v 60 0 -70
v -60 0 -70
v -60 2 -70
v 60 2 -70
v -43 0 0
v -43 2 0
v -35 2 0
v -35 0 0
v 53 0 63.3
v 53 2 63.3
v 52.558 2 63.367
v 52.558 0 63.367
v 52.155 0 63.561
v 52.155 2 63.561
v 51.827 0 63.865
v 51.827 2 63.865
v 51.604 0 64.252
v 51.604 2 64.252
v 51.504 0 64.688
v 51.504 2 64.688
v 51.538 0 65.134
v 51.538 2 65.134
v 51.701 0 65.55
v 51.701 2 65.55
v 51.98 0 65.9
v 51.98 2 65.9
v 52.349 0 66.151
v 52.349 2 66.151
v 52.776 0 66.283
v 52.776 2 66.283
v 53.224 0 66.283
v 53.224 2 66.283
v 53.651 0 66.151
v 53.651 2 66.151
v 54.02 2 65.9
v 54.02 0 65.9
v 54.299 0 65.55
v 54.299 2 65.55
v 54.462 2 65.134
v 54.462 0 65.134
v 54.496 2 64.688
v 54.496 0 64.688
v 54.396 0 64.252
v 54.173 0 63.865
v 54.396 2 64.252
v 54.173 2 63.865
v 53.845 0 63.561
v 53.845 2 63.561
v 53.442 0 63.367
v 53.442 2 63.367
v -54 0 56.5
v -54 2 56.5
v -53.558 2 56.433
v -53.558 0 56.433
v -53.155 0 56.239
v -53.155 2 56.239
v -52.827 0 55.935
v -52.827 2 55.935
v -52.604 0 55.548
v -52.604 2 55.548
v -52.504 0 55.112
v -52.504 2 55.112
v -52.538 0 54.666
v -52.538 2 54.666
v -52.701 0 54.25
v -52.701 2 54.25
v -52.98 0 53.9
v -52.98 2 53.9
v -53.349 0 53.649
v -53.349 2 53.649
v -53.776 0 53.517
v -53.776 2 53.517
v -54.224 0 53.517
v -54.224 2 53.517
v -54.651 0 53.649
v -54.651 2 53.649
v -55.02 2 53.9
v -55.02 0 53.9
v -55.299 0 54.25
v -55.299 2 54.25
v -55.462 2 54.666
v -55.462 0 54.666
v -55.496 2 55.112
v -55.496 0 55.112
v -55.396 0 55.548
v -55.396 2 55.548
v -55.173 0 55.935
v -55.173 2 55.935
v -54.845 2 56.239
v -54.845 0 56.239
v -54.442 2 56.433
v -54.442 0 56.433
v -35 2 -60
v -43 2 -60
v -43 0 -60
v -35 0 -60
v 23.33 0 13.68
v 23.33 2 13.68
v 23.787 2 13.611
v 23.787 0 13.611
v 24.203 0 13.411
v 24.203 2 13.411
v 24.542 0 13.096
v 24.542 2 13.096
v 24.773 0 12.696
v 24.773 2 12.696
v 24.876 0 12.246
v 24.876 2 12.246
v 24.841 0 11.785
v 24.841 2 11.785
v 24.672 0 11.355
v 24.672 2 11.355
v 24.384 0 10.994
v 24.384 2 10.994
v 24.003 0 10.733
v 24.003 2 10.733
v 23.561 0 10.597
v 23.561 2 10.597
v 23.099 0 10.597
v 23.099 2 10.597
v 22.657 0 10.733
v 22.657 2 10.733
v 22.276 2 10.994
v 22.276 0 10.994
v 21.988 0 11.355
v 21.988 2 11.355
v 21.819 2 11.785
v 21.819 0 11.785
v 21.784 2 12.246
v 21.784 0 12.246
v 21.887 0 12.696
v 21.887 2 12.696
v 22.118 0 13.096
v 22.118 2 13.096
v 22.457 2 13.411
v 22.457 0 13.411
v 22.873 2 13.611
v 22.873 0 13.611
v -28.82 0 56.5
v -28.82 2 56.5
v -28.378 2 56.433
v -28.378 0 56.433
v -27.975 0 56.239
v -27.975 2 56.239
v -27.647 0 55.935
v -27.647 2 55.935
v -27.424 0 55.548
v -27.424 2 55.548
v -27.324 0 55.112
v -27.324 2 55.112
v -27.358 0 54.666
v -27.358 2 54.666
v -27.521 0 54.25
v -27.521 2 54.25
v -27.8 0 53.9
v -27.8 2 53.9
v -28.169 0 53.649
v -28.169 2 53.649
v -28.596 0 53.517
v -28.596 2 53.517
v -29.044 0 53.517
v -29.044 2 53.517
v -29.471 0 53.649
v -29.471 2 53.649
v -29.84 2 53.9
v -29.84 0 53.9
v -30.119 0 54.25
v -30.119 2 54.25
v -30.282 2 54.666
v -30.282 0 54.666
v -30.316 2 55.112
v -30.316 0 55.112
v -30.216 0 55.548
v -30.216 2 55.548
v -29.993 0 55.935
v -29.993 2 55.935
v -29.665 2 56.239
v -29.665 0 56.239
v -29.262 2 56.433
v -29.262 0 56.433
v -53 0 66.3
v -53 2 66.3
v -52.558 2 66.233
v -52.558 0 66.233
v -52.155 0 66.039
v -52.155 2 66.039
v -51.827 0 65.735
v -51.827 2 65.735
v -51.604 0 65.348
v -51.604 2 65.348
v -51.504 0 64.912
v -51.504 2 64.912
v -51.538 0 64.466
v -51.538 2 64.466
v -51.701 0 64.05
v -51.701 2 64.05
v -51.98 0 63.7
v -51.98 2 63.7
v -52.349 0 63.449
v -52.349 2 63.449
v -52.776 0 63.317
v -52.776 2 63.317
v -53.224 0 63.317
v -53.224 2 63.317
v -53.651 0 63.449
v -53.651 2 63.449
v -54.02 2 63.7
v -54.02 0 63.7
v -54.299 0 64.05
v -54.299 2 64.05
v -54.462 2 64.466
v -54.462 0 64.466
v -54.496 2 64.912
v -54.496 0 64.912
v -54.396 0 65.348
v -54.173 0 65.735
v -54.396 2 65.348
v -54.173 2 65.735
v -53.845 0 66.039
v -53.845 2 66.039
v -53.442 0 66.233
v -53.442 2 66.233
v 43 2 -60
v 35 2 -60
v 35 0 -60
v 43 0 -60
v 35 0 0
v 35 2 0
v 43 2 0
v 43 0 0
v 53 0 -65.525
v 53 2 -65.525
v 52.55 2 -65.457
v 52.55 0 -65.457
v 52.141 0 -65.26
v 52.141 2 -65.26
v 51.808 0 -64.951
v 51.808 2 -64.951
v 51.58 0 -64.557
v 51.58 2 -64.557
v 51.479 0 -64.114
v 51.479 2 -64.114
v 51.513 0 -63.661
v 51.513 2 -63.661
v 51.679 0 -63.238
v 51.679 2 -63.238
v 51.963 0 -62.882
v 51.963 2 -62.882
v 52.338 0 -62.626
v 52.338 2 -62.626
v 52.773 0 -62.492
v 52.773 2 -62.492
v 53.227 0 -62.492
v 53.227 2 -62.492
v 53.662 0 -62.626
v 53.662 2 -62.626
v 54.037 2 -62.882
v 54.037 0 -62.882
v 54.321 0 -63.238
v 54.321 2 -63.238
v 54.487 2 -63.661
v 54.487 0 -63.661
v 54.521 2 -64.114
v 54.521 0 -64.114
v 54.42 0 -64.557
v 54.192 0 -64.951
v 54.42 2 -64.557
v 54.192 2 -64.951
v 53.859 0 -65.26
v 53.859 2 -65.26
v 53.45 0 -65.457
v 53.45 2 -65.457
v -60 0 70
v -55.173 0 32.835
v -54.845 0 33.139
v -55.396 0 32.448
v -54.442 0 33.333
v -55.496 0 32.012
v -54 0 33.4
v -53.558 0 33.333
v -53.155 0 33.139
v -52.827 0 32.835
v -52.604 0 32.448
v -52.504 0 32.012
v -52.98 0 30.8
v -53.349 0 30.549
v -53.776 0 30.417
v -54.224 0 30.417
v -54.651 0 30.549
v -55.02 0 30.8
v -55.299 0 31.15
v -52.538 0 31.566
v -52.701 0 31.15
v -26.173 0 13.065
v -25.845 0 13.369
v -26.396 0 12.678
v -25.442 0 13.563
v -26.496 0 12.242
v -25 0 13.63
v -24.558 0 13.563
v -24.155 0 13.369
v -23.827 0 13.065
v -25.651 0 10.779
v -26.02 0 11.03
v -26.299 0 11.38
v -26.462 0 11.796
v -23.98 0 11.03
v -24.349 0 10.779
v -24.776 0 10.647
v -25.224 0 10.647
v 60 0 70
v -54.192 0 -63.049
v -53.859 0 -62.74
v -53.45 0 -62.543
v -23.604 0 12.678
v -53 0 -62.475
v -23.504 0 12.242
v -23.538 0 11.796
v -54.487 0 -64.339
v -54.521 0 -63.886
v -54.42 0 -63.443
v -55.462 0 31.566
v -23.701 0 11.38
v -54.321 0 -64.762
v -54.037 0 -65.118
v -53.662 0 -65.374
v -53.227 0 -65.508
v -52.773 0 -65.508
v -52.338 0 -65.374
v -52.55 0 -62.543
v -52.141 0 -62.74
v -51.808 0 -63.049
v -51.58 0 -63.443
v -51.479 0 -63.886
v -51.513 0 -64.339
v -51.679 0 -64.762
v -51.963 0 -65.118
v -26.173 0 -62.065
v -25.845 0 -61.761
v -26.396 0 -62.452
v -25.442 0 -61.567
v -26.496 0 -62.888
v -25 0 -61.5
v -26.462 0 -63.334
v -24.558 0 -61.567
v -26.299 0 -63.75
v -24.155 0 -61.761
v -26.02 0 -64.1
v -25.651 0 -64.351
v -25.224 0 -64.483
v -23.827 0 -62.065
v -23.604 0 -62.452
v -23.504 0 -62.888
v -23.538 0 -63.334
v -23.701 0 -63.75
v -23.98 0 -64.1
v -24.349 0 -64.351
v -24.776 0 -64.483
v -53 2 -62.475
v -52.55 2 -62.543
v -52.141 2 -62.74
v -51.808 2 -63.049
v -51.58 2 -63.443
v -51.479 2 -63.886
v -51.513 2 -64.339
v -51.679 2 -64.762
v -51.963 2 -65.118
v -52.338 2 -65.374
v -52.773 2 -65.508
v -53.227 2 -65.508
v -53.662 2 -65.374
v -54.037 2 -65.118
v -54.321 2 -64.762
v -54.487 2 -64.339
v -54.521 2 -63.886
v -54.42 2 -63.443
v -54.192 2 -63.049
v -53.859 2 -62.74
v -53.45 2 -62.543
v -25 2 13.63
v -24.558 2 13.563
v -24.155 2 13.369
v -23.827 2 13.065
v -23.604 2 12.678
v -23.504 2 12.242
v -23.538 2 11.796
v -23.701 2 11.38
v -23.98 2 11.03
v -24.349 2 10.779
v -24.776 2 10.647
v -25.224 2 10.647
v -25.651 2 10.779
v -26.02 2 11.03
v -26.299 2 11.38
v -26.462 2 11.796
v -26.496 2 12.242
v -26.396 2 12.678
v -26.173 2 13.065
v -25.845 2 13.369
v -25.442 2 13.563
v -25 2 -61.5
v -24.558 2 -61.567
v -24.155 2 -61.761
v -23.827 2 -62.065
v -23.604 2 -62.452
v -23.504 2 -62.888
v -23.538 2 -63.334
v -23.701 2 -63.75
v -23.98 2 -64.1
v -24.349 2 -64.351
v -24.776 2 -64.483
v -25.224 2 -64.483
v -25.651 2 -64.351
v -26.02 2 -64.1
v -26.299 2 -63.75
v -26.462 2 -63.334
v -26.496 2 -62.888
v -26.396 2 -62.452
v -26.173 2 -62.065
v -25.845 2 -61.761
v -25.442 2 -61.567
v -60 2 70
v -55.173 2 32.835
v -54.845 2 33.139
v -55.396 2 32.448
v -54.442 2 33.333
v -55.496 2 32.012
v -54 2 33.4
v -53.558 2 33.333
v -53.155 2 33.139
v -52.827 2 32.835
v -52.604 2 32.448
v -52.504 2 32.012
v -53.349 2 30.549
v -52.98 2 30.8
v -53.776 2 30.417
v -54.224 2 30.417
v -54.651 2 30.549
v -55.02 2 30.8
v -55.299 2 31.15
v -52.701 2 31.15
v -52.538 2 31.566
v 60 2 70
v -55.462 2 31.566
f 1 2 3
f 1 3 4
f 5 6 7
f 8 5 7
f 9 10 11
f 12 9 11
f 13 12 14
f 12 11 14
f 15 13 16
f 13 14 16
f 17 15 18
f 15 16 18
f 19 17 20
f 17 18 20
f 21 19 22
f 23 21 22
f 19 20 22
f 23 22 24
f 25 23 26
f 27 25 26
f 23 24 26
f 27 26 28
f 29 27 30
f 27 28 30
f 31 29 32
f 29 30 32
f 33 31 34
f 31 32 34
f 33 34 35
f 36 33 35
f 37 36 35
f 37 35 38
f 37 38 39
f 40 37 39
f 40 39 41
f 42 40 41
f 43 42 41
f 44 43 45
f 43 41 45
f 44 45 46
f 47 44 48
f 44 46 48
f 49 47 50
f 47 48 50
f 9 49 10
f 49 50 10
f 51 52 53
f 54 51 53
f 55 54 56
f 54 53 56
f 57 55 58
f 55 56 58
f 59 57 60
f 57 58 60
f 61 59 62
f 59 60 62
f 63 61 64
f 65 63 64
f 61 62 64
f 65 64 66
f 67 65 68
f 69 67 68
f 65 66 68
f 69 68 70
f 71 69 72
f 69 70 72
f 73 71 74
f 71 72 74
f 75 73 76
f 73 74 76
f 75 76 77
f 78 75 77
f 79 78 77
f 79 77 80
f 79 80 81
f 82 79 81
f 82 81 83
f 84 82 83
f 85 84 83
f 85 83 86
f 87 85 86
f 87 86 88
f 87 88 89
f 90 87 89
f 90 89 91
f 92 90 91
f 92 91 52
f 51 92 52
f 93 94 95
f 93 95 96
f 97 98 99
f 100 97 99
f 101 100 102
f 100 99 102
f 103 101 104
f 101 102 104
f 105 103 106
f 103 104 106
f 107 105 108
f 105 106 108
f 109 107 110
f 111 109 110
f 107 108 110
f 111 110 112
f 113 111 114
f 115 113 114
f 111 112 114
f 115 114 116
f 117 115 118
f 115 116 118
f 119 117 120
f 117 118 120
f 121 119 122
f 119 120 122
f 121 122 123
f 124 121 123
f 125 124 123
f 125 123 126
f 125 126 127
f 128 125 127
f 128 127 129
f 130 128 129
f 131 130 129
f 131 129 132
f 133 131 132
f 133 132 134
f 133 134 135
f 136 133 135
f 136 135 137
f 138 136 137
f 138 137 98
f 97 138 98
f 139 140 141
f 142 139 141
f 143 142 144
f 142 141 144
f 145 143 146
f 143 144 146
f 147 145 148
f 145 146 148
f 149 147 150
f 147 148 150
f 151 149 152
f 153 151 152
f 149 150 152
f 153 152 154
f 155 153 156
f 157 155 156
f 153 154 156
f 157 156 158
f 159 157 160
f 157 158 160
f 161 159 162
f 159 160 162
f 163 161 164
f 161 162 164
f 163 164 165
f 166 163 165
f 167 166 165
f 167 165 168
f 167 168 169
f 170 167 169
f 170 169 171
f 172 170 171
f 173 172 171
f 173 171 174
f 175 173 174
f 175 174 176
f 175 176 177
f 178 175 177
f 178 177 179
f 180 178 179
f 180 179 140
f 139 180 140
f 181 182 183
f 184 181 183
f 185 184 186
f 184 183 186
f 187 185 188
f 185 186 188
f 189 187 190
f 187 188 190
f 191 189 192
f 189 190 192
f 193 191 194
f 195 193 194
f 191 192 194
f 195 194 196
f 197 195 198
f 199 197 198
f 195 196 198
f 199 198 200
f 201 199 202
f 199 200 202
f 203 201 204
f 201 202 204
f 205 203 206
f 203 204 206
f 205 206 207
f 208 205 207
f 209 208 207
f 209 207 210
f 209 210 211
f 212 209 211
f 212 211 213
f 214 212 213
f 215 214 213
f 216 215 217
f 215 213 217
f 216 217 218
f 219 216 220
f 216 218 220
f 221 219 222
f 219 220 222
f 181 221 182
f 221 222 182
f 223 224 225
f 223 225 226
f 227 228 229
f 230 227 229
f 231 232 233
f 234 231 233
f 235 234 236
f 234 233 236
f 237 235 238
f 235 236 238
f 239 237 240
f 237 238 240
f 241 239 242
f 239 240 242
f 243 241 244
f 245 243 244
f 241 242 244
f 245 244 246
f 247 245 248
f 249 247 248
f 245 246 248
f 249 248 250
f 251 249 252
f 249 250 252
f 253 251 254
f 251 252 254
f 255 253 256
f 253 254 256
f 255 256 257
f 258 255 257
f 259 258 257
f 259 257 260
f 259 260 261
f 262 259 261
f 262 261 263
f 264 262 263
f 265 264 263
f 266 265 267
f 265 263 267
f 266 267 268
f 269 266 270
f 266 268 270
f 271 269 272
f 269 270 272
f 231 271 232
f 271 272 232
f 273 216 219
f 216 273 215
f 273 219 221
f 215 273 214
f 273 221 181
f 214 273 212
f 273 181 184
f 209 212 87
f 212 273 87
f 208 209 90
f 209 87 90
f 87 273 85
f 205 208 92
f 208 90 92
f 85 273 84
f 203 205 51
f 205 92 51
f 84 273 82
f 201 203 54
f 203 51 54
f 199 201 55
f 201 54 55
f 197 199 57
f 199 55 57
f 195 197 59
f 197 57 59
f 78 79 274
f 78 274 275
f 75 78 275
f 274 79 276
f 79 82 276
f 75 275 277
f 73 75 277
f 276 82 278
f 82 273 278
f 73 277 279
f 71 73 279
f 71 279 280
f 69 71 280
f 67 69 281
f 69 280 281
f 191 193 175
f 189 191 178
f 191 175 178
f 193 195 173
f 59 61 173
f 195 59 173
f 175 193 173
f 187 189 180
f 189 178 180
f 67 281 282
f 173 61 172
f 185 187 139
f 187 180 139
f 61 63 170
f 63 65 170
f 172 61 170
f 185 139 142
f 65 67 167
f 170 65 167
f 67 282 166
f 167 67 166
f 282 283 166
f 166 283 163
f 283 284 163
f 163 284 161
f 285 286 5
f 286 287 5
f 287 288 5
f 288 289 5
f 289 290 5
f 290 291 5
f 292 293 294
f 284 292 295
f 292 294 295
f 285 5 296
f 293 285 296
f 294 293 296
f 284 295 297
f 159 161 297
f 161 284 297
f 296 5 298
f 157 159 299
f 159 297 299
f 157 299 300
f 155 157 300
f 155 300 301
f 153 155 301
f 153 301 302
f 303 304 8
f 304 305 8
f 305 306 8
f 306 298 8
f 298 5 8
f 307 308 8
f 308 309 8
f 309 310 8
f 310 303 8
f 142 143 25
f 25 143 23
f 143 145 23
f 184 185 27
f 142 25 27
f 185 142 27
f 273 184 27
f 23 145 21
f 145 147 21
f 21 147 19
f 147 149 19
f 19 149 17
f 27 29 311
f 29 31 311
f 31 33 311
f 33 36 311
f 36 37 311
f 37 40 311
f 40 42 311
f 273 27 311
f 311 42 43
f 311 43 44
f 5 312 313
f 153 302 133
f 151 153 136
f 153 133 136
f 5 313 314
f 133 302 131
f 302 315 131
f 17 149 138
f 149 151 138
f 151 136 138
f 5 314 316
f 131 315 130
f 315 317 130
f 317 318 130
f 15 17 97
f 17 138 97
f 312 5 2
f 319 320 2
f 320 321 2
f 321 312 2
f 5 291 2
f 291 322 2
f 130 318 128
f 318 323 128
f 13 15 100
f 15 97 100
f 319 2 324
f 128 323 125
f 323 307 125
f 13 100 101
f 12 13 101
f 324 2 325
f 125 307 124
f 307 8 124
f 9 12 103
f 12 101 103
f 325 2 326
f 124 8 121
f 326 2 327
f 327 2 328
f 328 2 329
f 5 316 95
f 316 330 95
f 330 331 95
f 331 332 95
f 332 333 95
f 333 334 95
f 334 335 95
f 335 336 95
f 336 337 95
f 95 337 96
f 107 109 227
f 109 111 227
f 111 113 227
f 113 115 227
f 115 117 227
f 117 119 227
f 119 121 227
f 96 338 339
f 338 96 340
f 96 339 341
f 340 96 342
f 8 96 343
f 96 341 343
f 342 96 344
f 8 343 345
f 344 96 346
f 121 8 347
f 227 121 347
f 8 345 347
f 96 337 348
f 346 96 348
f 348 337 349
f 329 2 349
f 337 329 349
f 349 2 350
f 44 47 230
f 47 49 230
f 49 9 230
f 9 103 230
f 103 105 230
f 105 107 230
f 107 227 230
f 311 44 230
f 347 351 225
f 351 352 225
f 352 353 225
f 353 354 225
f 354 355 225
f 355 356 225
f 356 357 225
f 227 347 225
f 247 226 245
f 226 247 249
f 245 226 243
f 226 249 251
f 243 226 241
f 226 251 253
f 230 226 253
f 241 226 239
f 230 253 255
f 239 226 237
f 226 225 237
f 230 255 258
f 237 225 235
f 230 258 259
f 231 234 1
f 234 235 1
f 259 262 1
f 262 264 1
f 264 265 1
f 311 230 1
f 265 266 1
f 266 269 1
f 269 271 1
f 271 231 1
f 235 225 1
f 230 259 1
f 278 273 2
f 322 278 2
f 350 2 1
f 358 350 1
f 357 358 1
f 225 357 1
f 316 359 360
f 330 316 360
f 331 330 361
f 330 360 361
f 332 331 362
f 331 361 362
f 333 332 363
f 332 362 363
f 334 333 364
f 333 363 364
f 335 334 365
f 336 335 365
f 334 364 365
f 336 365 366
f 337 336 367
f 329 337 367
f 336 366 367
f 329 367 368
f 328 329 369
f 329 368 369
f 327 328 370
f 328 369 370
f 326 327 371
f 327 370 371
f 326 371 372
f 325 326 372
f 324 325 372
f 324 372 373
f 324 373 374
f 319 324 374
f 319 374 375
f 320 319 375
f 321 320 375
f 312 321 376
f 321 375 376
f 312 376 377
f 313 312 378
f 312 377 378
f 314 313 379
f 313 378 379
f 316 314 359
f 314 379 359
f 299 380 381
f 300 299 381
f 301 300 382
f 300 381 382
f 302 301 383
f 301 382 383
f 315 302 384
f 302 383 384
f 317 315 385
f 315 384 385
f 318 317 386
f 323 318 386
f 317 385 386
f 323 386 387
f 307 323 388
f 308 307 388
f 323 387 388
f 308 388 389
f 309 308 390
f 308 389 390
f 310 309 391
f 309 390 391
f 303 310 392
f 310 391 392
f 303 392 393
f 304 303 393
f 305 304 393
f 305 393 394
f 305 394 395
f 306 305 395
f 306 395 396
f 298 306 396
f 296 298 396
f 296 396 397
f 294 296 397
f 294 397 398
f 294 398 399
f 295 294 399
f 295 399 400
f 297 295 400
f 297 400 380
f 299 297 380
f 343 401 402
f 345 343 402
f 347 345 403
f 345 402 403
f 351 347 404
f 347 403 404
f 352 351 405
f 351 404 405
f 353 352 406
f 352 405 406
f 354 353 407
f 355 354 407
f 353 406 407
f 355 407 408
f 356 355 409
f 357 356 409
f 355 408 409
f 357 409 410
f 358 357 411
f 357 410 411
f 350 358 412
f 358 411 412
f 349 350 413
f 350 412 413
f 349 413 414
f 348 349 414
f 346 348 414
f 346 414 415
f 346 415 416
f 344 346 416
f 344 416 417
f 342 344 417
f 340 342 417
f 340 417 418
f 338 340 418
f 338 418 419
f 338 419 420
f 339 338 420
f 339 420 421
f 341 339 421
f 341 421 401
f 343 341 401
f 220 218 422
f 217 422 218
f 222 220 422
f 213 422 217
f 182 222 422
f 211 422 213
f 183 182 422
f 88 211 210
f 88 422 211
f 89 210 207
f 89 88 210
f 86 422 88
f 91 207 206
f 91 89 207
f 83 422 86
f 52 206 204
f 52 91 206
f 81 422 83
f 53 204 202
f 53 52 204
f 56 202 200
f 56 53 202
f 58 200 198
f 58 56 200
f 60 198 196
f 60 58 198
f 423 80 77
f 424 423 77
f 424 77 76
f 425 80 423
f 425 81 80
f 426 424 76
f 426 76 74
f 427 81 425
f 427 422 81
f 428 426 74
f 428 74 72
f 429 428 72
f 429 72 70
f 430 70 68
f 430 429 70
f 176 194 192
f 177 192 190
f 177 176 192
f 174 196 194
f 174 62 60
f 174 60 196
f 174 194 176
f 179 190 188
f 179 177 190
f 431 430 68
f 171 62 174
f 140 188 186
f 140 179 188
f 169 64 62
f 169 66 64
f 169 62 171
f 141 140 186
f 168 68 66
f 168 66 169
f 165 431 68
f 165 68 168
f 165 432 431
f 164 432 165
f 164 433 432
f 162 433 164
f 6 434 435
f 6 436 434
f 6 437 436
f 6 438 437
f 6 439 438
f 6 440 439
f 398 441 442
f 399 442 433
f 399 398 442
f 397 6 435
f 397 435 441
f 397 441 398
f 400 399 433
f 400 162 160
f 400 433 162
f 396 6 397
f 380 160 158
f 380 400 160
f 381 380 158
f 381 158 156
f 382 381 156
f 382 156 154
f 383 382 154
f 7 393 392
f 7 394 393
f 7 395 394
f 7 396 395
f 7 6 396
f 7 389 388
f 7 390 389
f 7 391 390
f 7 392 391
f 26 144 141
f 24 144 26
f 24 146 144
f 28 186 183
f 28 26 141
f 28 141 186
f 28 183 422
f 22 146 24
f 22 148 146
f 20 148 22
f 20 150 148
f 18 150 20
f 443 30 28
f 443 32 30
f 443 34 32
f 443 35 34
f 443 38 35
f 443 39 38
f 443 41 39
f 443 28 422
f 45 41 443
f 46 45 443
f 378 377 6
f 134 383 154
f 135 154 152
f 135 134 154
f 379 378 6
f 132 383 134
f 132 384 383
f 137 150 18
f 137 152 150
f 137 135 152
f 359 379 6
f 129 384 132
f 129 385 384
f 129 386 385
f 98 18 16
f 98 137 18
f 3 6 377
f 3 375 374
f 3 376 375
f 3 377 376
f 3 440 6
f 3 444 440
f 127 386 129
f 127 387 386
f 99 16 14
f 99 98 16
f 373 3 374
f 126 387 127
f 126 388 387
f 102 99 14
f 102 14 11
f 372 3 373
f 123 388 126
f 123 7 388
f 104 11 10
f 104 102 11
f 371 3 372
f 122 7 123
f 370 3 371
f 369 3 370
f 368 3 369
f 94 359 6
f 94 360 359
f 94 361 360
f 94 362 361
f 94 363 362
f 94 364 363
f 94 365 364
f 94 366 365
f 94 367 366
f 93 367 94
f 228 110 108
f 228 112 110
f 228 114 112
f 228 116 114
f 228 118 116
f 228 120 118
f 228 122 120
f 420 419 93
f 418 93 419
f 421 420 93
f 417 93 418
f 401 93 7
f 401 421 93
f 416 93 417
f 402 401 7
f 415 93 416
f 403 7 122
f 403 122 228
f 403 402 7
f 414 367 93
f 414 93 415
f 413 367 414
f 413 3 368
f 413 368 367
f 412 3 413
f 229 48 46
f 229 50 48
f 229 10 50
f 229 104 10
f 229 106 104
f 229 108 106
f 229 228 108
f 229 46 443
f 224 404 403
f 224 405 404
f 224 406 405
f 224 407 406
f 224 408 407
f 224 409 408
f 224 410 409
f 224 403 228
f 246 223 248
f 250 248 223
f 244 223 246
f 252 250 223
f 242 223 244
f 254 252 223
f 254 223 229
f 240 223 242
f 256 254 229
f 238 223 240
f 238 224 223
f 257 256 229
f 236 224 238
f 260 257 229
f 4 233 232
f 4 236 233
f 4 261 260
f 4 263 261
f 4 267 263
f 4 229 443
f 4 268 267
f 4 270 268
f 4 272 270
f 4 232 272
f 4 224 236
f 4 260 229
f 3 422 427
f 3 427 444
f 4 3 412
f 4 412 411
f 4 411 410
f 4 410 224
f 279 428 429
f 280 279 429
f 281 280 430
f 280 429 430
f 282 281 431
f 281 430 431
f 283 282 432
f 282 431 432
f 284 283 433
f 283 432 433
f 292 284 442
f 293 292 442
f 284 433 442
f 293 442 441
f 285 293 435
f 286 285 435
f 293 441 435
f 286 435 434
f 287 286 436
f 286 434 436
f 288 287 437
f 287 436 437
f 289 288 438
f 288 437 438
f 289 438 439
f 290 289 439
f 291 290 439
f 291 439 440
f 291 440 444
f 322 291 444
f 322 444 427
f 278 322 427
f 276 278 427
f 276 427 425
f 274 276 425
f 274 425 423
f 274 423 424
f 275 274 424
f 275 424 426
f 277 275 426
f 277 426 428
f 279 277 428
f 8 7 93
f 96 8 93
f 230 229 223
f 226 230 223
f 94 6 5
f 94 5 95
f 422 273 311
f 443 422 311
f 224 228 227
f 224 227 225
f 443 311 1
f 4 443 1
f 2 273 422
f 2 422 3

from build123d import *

# Parameters (mm, degrees)
SKETCH1_W           = 120
SKETCH1_H           = 140
BOSS_EXTRUDE1_DEPTH = 2
SKETCH2_R           = 1.525
SKETCH2_R_2         = 1.5
CUT_EXTRUDE1_DEPTH  = 2
SKETCH4_R           = 1.5
SKETCH4_R_2         = 1.55
SKETCH4_W           = 8
SKETCH4_H           = 60
CUT_EXTRUDE2_DEPTH  = 93.217135067
SKETCH5_R           = 1.5
CUT_EXTRUDE3_DEPTH  = 93.217135067


with BuildPart() as part:
    # Sketch1 → Boss-Extrude1 (new body)
    with BuildSketch(Plane(origin=(0, 0, 0), x_dir=(1, 0, 0), z_dir=(0, 1, 0))):
        Rectangle(SKETCH1_W, SKETCH1_H)
    extrude(amount=BOSS_EXTRUDE1_DEPTH)

    # Sketch2 → Cut-Extrude1 (cut)
    with BuildSketch(Plane(origin=(0, 2, 0), x_dir=(1, 0, 0), z_dir=(0, 1, 0))):
        with Locations(Location((-53, 64, 0), (0, 0, 270))):
            Circle(SKETCH2_R)
        with Locations(Location((-53, -64.8, 0), (0, 0, 270))):
            Circle(SKETCH2_R_2)
        with Locations(Location((53, 64, 0), (0, 0, 90))):
            Circle(SKETCH2_R)
        with Locations(Location((53, -64.8, 0), (0, 0, 90))):
            Circle(SKETCH2_R_2)
    extrude(amount=-CUT_EXTRUDE1_DEPTH, mode=Mode.SUBTRACT)

    # Sketch4 → Cut-Extrude2 (cut, through all)
    with BuildSketch(Plane(origin=(0, 2, 0), x_dir=(1, 0, 0), z_dir=(0, 1, 0))):
        with Locations(Location((-25, 63, 0), (0, 0, 270))):
            Circle(SKETCH4_R)
        with Locations(Location((-25, -12.13, 0), (0, 0, 270))):
            Circle(SKETCH4_R)
        with Locations(Location((23.33, -12.13, 0), (0, 0, 270))):
            Circle(SKETCH4_R_2)
        with Locations((-39, 30)):
            Rectangle(SKETCH4_W, SKETCH4_H)
        with Locations((39, 30)):
            Rectangle(SKETCH4_W, SKETCH4_H)
    extrude(amount=-CUT_EXTRUDE2_DEPTH, mode=Mode.SUBTRACT)

    # Sketch5 → Cut-Extrude3 (cut, through all)
    with BuildSketch(Plane(origin=(0, 2, 0), x_dir=(1, 0, 0), z_dir=(0, 1, 0))):
        with Locations(Location((-54, -55, 0), (0, 0, 270))):
            Circle(SKETCH5_R)
        with Locations(Location((-28.82, -55, 0), (0, 0, 270))):
            Circle(SKETCH5_R)
        with Locations(Location((-54, -31.9, 0), (0, 0, 270))):
            Circle(SKETCH5_R)
    extrude(amount=-CUT_EXTRUDE3_DEPTH, mode=Mode.SUBTRACT)


solid = part.part
